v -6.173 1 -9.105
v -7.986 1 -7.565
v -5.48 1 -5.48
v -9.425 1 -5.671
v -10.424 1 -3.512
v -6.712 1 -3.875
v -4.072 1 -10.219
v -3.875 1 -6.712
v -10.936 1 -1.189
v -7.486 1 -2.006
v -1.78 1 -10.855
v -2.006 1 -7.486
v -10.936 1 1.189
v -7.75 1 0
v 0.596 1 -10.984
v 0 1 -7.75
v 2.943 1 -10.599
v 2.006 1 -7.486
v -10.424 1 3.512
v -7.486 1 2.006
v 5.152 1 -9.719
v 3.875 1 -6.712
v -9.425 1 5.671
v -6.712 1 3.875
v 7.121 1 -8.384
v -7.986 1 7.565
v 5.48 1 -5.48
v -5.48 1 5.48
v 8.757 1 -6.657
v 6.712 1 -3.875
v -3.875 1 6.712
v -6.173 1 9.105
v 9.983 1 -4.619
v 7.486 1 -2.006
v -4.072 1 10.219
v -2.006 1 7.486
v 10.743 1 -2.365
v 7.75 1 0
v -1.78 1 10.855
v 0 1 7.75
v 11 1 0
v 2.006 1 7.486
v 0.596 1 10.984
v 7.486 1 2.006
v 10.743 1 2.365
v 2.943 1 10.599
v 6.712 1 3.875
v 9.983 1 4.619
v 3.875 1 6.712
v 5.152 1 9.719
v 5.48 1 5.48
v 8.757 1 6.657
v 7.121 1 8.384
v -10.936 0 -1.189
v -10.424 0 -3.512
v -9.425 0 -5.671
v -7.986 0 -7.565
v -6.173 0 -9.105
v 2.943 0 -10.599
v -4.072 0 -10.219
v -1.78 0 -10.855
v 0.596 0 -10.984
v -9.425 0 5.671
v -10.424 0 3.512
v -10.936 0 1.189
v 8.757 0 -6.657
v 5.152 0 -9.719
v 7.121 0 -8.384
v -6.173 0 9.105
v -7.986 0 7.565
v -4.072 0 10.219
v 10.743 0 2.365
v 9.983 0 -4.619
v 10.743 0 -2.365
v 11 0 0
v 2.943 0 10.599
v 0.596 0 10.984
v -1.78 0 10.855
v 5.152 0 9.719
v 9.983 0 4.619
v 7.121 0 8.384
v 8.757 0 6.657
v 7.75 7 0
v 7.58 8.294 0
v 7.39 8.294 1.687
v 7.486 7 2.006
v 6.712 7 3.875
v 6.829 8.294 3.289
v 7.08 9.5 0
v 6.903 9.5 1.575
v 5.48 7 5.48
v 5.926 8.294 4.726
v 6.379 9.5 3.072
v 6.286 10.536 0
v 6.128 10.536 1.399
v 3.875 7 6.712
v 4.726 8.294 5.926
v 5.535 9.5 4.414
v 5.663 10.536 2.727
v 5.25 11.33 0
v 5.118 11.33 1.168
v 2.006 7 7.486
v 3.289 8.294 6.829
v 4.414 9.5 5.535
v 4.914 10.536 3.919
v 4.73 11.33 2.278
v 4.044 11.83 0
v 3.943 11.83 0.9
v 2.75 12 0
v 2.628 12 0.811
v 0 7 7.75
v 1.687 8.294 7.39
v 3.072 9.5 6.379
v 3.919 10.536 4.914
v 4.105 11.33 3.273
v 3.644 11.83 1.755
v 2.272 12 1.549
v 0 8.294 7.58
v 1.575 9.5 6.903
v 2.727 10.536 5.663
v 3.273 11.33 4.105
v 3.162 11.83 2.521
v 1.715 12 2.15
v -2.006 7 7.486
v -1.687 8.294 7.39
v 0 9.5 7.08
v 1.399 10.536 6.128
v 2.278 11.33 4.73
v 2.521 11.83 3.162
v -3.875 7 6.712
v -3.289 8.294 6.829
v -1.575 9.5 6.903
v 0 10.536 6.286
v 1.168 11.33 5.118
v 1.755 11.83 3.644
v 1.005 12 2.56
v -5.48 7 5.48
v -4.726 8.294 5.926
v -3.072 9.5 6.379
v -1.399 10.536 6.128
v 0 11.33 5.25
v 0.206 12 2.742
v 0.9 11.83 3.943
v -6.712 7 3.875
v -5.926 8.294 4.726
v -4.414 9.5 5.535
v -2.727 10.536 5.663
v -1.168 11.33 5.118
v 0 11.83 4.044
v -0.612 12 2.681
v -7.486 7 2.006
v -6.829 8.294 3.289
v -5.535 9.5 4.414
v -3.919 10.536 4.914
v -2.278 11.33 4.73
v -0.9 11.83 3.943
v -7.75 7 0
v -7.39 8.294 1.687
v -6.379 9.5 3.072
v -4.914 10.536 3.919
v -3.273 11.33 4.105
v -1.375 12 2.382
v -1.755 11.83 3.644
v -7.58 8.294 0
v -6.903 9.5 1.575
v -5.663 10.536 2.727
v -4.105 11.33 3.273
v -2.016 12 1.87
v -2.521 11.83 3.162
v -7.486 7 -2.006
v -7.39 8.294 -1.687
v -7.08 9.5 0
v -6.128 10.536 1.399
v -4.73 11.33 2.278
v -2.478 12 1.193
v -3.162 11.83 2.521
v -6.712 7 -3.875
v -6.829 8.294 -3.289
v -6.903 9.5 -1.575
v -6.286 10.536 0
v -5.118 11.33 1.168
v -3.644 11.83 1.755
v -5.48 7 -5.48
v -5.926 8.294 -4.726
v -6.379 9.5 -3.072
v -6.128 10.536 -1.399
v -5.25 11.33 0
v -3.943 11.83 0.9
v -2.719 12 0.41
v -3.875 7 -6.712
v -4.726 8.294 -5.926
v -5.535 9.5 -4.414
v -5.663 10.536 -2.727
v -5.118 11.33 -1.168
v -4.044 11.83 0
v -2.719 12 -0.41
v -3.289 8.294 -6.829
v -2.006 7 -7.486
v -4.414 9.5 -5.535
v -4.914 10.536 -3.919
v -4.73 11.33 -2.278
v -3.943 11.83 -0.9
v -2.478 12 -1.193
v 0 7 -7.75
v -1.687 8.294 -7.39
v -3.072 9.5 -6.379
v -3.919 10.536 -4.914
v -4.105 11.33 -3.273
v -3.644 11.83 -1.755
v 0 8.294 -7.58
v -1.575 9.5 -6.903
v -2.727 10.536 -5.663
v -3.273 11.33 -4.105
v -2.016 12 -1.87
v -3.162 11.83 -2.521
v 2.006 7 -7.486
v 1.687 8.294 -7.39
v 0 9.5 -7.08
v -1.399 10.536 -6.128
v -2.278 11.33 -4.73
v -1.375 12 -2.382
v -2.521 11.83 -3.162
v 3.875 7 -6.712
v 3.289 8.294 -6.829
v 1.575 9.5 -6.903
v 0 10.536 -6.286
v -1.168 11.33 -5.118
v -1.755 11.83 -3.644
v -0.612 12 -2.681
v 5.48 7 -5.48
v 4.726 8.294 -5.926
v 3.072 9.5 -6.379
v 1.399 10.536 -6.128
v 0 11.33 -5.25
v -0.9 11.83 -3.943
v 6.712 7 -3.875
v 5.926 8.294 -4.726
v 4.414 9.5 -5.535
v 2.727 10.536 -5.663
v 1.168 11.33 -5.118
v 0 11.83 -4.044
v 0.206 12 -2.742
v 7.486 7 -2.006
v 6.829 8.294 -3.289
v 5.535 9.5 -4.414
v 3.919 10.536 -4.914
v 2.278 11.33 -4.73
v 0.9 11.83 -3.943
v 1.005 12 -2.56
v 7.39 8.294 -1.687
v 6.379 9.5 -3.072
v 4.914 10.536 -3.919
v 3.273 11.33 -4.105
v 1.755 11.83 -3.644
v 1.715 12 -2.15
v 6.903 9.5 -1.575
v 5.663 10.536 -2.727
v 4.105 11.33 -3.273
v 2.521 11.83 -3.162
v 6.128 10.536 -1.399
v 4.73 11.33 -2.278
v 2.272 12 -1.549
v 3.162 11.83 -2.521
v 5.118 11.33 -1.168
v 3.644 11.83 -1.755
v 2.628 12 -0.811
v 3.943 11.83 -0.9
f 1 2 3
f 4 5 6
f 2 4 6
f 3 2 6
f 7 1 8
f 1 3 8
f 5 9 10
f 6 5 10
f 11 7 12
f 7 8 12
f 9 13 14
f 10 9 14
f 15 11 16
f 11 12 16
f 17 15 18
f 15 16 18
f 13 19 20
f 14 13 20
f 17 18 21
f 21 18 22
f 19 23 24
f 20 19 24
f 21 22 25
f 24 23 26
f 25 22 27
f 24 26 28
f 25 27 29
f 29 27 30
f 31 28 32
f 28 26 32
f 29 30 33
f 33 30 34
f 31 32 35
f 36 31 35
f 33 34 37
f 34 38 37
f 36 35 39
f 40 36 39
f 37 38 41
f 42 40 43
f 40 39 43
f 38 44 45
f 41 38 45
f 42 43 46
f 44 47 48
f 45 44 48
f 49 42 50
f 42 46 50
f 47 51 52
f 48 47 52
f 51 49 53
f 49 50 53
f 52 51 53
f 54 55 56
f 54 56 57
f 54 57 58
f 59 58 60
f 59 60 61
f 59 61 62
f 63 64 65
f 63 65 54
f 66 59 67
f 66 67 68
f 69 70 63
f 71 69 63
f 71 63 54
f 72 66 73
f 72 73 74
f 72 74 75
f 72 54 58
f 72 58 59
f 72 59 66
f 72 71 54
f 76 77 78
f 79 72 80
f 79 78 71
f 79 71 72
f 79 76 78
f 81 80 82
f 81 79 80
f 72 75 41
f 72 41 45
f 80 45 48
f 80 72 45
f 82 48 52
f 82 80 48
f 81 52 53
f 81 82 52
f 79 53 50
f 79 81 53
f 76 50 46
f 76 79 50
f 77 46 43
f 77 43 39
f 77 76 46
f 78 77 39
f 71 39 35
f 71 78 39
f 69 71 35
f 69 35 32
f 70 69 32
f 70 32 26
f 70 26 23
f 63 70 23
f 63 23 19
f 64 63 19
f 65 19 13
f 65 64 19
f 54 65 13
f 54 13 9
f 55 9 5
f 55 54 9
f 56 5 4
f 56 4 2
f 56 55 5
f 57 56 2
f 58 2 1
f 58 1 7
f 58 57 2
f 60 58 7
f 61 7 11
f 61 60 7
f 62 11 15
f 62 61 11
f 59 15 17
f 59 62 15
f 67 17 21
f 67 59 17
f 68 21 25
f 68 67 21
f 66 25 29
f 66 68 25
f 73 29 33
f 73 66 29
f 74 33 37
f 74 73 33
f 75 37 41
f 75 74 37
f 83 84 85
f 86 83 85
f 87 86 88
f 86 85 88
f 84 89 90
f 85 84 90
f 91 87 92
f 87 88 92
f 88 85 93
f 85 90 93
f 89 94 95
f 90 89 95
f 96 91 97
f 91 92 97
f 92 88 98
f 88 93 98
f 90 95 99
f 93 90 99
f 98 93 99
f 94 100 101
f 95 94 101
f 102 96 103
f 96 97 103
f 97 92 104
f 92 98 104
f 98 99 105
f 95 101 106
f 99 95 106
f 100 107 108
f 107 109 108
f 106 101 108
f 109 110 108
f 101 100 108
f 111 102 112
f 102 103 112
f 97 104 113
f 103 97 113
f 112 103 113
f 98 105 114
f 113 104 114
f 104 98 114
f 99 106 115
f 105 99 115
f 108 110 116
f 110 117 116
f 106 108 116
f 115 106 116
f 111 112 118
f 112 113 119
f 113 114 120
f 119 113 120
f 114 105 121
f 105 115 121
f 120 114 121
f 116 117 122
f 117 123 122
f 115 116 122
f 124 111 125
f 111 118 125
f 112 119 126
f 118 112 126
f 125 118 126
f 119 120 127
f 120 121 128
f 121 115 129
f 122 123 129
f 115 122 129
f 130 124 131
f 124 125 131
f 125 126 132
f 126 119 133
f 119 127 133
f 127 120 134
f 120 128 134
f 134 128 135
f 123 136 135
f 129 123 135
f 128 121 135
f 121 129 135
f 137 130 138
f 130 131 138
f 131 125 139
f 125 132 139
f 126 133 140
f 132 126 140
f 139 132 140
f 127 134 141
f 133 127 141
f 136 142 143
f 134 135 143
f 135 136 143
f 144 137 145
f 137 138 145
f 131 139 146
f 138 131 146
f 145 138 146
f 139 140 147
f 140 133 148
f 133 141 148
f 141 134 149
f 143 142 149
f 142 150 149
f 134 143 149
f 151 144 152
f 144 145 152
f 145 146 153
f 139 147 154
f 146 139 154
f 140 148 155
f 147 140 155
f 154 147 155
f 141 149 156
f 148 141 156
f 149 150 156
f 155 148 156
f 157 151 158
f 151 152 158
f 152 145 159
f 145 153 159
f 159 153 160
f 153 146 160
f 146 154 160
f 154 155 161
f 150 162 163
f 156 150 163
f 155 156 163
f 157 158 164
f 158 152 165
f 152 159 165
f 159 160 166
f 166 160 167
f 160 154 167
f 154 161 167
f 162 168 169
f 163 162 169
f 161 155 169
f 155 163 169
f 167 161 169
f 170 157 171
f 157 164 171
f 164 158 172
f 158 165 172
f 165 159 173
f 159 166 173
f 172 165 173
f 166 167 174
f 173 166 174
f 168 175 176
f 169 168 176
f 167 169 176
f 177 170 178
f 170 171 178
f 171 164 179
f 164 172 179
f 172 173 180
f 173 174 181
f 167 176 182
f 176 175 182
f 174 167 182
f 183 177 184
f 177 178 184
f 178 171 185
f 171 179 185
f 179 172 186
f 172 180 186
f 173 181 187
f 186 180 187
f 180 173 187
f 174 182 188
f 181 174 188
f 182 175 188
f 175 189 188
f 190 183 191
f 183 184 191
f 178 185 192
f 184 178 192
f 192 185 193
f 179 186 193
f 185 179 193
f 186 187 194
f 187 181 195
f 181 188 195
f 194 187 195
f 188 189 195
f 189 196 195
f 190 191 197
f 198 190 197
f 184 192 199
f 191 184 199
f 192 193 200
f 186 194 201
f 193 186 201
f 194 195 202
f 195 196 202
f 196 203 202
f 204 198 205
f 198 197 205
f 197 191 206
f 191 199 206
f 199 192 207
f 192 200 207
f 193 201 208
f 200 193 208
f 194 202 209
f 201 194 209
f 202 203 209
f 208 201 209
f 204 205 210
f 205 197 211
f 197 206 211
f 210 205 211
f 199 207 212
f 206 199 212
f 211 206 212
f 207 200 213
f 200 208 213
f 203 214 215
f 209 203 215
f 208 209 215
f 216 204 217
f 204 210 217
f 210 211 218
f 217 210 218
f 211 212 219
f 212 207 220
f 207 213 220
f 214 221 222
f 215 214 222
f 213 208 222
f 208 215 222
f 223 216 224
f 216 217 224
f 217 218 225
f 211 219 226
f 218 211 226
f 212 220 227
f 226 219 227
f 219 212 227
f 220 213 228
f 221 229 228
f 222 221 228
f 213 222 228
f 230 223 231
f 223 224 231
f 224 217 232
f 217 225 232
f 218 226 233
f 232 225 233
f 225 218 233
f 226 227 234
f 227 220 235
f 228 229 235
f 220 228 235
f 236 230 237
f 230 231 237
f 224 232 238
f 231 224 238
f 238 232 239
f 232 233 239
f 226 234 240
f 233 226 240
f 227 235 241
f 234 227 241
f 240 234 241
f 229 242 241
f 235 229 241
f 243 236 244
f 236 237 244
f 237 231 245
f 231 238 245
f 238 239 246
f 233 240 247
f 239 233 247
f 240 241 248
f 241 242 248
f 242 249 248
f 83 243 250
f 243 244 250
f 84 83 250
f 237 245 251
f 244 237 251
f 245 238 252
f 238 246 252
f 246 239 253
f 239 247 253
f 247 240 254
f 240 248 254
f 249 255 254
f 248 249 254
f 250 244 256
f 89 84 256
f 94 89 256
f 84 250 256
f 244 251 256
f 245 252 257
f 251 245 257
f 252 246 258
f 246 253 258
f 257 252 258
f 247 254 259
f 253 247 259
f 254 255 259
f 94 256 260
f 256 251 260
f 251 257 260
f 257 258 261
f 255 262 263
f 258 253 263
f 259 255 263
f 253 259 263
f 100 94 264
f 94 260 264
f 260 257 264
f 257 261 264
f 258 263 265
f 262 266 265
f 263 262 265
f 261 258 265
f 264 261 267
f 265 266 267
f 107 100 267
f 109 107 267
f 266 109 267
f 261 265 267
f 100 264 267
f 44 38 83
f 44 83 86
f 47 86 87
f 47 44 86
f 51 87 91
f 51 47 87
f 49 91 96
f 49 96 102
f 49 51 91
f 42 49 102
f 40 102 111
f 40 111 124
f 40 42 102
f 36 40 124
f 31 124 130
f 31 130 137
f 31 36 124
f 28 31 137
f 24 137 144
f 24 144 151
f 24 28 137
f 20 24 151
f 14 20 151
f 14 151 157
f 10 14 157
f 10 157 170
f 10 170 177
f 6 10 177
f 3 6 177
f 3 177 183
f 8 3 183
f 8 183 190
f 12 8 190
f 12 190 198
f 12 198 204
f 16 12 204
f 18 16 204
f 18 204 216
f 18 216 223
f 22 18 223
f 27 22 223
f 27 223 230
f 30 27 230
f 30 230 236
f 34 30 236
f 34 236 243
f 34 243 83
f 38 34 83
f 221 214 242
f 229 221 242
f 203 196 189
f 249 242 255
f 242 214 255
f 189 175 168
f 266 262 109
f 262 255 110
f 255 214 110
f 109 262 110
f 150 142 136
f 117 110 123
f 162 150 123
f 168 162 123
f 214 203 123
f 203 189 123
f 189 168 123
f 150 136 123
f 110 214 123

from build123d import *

# Parameters (mm, degrees)
F0_R     = 7.75
F1_DEPTH = 12
F0_R_2   = 11
F2_DEPTH = 1
F3_R     = 5


with BuildPart() as f1:
    # F0 (on Front) → F1 (new body)
    with BuildSketch(Plane.XZ):
        Circle(F0_R)
    extrude(amount=-F1_DEPTH)

    # F0 (on Front) → F2 (join)
    with BuildSketch(Plane.XZ):
        Circle(F0_R_2)
        Circle(F0_R, mode=Mode.SUBTRACT)
    extrude(amount=-F2_DEPTH)

    # F3
    f3_edges = [f1.edges().sort_by_distance(p)[0] for p in [
        (-7.75, 12, 0),
    ]]
    fillet(f3_edges, radius=F3_R)


solid = f1.part
